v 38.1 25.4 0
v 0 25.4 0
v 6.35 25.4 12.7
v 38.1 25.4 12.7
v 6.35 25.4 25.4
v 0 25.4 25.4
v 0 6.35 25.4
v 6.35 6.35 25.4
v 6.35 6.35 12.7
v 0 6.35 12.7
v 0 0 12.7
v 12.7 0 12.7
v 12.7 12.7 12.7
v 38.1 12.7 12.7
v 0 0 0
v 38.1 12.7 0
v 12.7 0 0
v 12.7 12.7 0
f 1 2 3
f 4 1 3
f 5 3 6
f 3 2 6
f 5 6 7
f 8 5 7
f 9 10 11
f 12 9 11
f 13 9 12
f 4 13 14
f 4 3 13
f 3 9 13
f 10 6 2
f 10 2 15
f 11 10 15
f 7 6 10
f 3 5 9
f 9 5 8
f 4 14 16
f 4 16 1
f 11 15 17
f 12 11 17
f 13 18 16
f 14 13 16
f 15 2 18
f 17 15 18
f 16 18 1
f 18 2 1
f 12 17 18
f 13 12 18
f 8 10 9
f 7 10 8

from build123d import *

# Parameters (mm, degrees)
F1_DEPTH = 12.7
F2_W     = 19.05
F2_H     = 12.7
F3_DEPTH = 6.35


with BuildPart() as f1:
    # F0 (on Top) → F1 (new body)
    with BuildSketch(Plane.XY):
        Polygon((38.1, 25.4), (0, 25.4), (0, 0), (12.7, 0), (12.7, 12.7), (38.1, 12.7), align=None)
    extrude(amount=F1_DEPTH)

    # F2 (on face) → F3 (join)
    with BuildSketch(Plane(origin=(0, 0, 0), x_dir=(0, -1, 0), z_dir=(-1, 0, 0))):
        with Locations((-15.875, 19.05)):
            Rectangle(F2_W, F2_H)
    extrude(amount=-F3_DEPTH)


solid = f1.part
